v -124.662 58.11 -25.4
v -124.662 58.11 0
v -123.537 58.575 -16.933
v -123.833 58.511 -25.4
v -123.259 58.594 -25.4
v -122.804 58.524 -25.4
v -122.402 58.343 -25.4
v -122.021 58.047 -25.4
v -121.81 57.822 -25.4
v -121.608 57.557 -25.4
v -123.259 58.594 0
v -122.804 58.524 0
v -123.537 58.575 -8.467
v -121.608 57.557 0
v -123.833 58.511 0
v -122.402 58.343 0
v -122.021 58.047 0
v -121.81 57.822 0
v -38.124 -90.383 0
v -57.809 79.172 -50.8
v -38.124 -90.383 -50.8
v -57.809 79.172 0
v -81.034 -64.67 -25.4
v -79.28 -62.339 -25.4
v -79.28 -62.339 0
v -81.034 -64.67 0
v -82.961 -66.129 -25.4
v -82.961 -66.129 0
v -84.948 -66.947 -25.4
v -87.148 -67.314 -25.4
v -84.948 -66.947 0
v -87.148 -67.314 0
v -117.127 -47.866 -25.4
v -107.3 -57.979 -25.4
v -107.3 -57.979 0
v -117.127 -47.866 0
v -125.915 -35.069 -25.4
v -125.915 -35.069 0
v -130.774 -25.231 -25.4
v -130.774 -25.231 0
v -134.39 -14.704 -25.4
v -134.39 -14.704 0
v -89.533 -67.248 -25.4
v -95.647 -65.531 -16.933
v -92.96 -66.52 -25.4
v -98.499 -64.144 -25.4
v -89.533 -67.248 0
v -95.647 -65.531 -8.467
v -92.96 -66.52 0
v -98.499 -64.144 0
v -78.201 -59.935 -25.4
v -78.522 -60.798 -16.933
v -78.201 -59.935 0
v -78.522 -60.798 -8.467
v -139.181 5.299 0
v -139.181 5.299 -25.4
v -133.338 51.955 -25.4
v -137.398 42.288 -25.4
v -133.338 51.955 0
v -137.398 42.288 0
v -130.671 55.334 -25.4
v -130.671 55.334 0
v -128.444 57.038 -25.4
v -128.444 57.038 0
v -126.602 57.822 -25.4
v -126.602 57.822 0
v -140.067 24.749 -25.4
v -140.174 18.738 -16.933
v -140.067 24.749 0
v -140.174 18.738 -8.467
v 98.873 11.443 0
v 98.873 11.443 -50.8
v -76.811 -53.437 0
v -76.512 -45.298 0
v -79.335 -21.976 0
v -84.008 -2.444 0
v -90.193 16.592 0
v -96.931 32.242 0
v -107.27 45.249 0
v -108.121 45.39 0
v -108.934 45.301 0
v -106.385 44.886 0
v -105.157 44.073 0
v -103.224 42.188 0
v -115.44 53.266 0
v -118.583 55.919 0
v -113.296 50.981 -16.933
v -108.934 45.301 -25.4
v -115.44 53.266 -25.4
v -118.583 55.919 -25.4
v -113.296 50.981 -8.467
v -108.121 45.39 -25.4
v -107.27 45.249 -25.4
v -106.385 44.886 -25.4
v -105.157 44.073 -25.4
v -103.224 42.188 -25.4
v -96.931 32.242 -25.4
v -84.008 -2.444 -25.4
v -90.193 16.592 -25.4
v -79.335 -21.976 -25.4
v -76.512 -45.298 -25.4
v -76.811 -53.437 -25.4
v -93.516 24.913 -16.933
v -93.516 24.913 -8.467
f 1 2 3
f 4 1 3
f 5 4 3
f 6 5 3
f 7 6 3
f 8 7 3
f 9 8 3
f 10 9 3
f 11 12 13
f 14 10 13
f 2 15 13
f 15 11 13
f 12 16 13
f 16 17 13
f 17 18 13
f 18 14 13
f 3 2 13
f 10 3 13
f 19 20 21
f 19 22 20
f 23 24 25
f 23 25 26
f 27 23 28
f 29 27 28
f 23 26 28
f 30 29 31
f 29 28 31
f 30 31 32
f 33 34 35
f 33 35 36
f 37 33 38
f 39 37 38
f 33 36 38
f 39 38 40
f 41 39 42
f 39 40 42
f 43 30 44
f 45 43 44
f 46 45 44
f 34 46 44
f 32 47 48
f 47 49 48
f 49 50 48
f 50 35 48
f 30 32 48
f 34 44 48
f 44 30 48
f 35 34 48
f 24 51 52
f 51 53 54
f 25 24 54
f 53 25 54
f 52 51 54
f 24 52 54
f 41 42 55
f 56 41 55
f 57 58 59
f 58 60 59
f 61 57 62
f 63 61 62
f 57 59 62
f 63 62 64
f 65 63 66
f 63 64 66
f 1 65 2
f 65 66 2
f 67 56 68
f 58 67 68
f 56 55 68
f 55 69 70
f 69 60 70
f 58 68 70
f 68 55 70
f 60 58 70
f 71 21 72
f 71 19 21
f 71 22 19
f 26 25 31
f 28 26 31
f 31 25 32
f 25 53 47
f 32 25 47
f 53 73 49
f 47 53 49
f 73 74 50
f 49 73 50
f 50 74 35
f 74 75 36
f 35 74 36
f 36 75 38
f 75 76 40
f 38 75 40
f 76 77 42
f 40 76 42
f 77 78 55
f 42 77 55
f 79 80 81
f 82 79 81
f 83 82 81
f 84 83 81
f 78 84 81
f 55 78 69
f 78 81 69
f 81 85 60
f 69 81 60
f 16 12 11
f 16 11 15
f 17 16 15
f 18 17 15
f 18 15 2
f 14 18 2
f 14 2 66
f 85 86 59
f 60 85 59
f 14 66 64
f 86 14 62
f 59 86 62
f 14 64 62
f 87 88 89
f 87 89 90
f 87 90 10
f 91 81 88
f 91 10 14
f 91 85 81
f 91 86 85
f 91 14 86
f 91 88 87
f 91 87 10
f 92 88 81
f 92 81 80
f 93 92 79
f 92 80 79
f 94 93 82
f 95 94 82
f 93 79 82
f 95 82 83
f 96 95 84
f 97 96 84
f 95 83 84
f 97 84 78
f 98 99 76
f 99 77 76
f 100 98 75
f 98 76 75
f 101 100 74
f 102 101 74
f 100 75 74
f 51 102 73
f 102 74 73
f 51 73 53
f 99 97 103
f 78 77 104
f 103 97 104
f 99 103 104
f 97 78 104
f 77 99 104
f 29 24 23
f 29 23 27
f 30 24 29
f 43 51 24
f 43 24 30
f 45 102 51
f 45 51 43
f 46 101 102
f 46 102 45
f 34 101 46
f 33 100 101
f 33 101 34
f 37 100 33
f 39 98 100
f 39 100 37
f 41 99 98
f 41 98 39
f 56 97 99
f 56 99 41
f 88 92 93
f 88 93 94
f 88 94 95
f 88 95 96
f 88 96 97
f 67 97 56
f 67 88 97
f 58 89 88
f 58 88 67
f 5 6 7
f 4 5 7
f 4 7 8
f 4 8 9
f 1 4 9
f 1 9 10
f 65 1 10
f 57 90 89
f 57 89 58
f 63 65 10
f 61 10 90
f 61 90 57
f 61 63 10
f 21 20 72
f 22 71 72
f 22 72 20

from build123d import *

# Parameters (mm, degrees)
F1_DEPTH = 25.4
F2_DEPTH = 25.4


with BuildPart() as f1:
    # F0 (on Top) → F1 (new body)
    with BuildSketch(Plane.XY):
        Polygon((-38.1237527186, -90.3830688664), (98.8726872316, 11.4427240084), (-57.8092561336, 79.1722247959), align=None)
    extrude(amount=-F1_DEPTH)

    # F2 (add): a face of the model
    f2_faces = [f1.faces().sort_by_distance(p)[0] for p in [
        (0.9798927931, 0.0772933126, -25.4),
    ]]
    extrude(f2_faces, amount=F2_DEPTH)


with BuildPart() as f1b:
    # F0 (on Top) → F1, piece 2 (new body)
    with BuildSketch(Plane.XY):
        with BuildLine():
            add(Edge.make_bspline(
                [(-134.3896687031, -14.7044314072), (-142.7311083397, 16.4550494294), (-131.6720253421, 53.4780620192), (-124.6619394967, 58.1101097866)],
                knots=[0.6200788677, 0.6200788677, 0.6200788677, 0.6200788677, 0.802576493, 0.802576493, 0.802576493, 0.802576493], degree=3))
            add(Edge.make_bspline(
                [(-79.2800709544, -62.338698645), (-87.958929987, -77.0308760174), (-121.9610045481, -49.7578284038), (-134.3896687031, -14.7044314072)],
                knots=[0.6992366772, 0.6992366772, 0.6992366772, 0.6992366772, 1, 1, 1, 1], degree=3))
            add(Edge.make_bspline(
                [(-78.2008010068, -59.9350369728), (-78.5139244232, -60.8143048025), (-78.8729099527, -61.6177568097), (-79.2800709605, -62.3386986554)],
                knots=[0.3989413153, 0.3989413153, 0.3989413153, 0.3989413153, 0.408006475, 0.408006475, 0.408006475, 0.408006475], degree=3))
            add(Edge.make_bspline(
                [(-108.9341402393, 45.3013569048), (-90.7063036706, 18.8782057756), (-71.7380579244, -40.8813965528), (-78.2008010068, -59.9350369728)],
                knots=[0.3761828281, 0.3761828281, 0.3761828281, 0.3761828281, 0.6847703081, 0.6847703081, 0.6847703081, 0.6847703081], degree=3))
            add(Edge.make_bspline(
                [(-118.667088449, 12.4472836033), (-118.2991094276, 12.9315110116), (-116.0400518155, 43.4534065078), (-108.9341402393, 45.3013569048)],
                knots=[0, 0, 0, 0, 0.1454516388, 0.1454516388, 0.1454516388, 0.1454516388], degree=3))
            add(Edge.make_bspline(
                [(-121.6075792909, 57.5565546751), (-117.0175792235, 50.9624056406), (-119.0897455595, 11.8911047308), (-118.667088449, 12.4472836033)],
                knots=[0.8329356681, 0.8329356681, 0.8329356681, 0.8329356681, 1, 1, 1, 1], degree=3))
            add(Edge.make_bspline(
                [(-124.6619394961, 58.1101097845), (-123.675580112, 58.1252412608), (-122.656053142, 57.9460527348), (-121.6075792909, 57.5565546751)],
                knots=[0.2820915799, 0.2820915799, 0.2820915799, 0.2820915799, 0.3018757781, 0.3018757781, 0.3018757781, 0.3018757781], degree=3))
        make_face()
        with BuildLine():
            add(Edge.make_bspline(
                [(-79.2800709544, -62.338698645), (-87.958929987, -77.0308760174), (-121.9610045481, -49.7578284038), (-134.3896687031, -14.7044314072)],
                knots=[0.6992366772, 0.6992366772, 0.6992366772, 0.6992366772, 1, 1, 1, 1], degree=3))
            add(Edge.make_bspline(
                [(-79.2800709605, -62.3386986554), (-88.8052874953, -79.2045749484), (-124.6964518245, -50.9134814909), (-134.3896687031, -14.7044314072)],
                knots=[0.408006475, 0.408006475, 0.408006475, 0.408006475, 0.6200788677, 0.6200788677, 0.6200788677, 0.6200788677], degree=3))
        make_face()
        with BuildLine():
            add(Edge.make_bspline(
                [(-134.3896687031, -14.7044314072), (-146.0467466828, 18.1728092317), (-138.7258744457, 57.8943587092), (-124.6619394961, 58.1101097845)],
                knots=[0, 0, 0, 0, 0.2820915799, 0.2820915799, 0.2820915799, 0.2820915799], degree=3))
            add(Edge.make_bspline(
                [(-134.3896687031, -14.7044314072), (-142.7311083397, 16.4550494294), (-131.6720253421, 53.4780620192), (-124.6619394967, 58.1101097866)],
                knots=[0.6200788677, 0.6200788677, 0.6200788677, 0.6200788677, 0.802576493, 0.802576493, 0.802576493, 0.802576493], degree=3))
        make_face()
        with BuildLine():
            add(Edge.make_bspline(
                [(-124.6619394967, 58.1101097866), (-123.4957850177, 58.8806685743), (-122.4416808244, 58.7548530936), (-121.6075792909, 57.5565546751)],
                knots=[0.802576493, 0.802576493, 0.802576493, 0.802576493, 0.8329356681, 0.8329356681, 0.8329356681, 0.8329356681], degree=3))
            add(Edge.make_bspline(
                [(-124.6619394961, 58.1101097845), (-123.675580112, 58.1252412608), (-122.656053142, 57.9460527348), (-121.6075792909, 57.5565546751)],
                knots=[0.2820915799, 0.2820915799, 0.2820915799, 0.2820915799, 0.3018757781, 0.3018757781, 0.3018757781, 0.3018757781], degree=3))
        make_face()
        with BuildLine():
            add(Edge.make_bspline(
                [(-78.2008010068, -59.9350369728), (-78.5139244232, -60.8143048025), (-78.8729099527, -61.6177568097), (-79.2800709605, -62.3386986554)],
                knots=[0.3989413153, 0.3989413153, 0.3989413153, 0.3989413153, 0.408006475, 0.408006475, 0.408006475, 0.408006475], degree=3))
            add(Edge.make_bspline(
                [(-78.2008010068, -59.9350369728), (-78.5037699646, -60.828258552), (-78.8626278416, -61.6320218533), (-79.2800709544, -62.338698645)],
                knots=[0.6847703081, 0.6847703081, 0.6847703081, 0.6847703081, 0.6992366772, 0.6992366772, 0.6992366772, 0.6992366772], degree=3))
        make_face()
        with BuildLine():
            add(Edge.make_bspline(
                [(-121.6075792909, 57.5565546751), (-117.6696386166, 56.0936471832), (-113.3233551368, 51.6639819008), (-108.9341402393, 45.3013569048)],
                knots=[0.3018757781, 0.3018757781, 0.3018757781, 0.3018757781, 0.3761828281, 0.3761828281, 0.3761828281, 0.3761828281], degree=3))
            add(Edge.make_bspline(
                [(-121.6075792909, 57.5565546751), (-117.0175792235, 50.9624056406), (-119.0897455595, 11.8911047308), (-118.667088449, 12.4472836033)],
                knots=[0.8329356681, 0.8329356681, 0.8329356681, 0.8329356681, 1, 1, 1, 1], degree=3))
            add(Edge.make_bspline(
                [(-118.667088449, 12.4472836033), (-118.2991094276, 12.9315110116), (-116.0400518155, 43.4534065078), (-108.9341402393, 45.3013569048)],
                knots=[0, 0, 0, 0, 0.1454516388, 0.1454516388, 0.1454516388, 0.1454516388], degree=3))
        make_face()
        with BuildLine():
            add(Edge.make_bspline(
                [(-108.9341402393, 45.3013569048), (-90.7063036706, 18.8782057756), (-71.7380579244, -40.8813965528), (-78.2008010068, -59.9350369728)],
                knots=[0.3761828281, 0.3761828281, 0.3761828281, 0.3761828281, 0.6847703081, 0.6847703081, 0.6847703081, 0.6847703081], degree=3))
            add(Edge.make_bspline(
                [(-108.9341402393, 45.3013569048), (-96.5501255883, 48.5219211555), (-69.4449096507, -35.3480109482), (-78.2008010068, -59.9350369728)],
                knots=[0.1454516388, 0.1454516388, 0.1454516388, 0.1454516388, 0.3989413153, 0.3989413153, 0.3989413153, 0.3989413153], degree=3))
        make_face()
    extrude(amount=-F1_DEPTH)


solid = Compound([f1.part, f1b.part])
